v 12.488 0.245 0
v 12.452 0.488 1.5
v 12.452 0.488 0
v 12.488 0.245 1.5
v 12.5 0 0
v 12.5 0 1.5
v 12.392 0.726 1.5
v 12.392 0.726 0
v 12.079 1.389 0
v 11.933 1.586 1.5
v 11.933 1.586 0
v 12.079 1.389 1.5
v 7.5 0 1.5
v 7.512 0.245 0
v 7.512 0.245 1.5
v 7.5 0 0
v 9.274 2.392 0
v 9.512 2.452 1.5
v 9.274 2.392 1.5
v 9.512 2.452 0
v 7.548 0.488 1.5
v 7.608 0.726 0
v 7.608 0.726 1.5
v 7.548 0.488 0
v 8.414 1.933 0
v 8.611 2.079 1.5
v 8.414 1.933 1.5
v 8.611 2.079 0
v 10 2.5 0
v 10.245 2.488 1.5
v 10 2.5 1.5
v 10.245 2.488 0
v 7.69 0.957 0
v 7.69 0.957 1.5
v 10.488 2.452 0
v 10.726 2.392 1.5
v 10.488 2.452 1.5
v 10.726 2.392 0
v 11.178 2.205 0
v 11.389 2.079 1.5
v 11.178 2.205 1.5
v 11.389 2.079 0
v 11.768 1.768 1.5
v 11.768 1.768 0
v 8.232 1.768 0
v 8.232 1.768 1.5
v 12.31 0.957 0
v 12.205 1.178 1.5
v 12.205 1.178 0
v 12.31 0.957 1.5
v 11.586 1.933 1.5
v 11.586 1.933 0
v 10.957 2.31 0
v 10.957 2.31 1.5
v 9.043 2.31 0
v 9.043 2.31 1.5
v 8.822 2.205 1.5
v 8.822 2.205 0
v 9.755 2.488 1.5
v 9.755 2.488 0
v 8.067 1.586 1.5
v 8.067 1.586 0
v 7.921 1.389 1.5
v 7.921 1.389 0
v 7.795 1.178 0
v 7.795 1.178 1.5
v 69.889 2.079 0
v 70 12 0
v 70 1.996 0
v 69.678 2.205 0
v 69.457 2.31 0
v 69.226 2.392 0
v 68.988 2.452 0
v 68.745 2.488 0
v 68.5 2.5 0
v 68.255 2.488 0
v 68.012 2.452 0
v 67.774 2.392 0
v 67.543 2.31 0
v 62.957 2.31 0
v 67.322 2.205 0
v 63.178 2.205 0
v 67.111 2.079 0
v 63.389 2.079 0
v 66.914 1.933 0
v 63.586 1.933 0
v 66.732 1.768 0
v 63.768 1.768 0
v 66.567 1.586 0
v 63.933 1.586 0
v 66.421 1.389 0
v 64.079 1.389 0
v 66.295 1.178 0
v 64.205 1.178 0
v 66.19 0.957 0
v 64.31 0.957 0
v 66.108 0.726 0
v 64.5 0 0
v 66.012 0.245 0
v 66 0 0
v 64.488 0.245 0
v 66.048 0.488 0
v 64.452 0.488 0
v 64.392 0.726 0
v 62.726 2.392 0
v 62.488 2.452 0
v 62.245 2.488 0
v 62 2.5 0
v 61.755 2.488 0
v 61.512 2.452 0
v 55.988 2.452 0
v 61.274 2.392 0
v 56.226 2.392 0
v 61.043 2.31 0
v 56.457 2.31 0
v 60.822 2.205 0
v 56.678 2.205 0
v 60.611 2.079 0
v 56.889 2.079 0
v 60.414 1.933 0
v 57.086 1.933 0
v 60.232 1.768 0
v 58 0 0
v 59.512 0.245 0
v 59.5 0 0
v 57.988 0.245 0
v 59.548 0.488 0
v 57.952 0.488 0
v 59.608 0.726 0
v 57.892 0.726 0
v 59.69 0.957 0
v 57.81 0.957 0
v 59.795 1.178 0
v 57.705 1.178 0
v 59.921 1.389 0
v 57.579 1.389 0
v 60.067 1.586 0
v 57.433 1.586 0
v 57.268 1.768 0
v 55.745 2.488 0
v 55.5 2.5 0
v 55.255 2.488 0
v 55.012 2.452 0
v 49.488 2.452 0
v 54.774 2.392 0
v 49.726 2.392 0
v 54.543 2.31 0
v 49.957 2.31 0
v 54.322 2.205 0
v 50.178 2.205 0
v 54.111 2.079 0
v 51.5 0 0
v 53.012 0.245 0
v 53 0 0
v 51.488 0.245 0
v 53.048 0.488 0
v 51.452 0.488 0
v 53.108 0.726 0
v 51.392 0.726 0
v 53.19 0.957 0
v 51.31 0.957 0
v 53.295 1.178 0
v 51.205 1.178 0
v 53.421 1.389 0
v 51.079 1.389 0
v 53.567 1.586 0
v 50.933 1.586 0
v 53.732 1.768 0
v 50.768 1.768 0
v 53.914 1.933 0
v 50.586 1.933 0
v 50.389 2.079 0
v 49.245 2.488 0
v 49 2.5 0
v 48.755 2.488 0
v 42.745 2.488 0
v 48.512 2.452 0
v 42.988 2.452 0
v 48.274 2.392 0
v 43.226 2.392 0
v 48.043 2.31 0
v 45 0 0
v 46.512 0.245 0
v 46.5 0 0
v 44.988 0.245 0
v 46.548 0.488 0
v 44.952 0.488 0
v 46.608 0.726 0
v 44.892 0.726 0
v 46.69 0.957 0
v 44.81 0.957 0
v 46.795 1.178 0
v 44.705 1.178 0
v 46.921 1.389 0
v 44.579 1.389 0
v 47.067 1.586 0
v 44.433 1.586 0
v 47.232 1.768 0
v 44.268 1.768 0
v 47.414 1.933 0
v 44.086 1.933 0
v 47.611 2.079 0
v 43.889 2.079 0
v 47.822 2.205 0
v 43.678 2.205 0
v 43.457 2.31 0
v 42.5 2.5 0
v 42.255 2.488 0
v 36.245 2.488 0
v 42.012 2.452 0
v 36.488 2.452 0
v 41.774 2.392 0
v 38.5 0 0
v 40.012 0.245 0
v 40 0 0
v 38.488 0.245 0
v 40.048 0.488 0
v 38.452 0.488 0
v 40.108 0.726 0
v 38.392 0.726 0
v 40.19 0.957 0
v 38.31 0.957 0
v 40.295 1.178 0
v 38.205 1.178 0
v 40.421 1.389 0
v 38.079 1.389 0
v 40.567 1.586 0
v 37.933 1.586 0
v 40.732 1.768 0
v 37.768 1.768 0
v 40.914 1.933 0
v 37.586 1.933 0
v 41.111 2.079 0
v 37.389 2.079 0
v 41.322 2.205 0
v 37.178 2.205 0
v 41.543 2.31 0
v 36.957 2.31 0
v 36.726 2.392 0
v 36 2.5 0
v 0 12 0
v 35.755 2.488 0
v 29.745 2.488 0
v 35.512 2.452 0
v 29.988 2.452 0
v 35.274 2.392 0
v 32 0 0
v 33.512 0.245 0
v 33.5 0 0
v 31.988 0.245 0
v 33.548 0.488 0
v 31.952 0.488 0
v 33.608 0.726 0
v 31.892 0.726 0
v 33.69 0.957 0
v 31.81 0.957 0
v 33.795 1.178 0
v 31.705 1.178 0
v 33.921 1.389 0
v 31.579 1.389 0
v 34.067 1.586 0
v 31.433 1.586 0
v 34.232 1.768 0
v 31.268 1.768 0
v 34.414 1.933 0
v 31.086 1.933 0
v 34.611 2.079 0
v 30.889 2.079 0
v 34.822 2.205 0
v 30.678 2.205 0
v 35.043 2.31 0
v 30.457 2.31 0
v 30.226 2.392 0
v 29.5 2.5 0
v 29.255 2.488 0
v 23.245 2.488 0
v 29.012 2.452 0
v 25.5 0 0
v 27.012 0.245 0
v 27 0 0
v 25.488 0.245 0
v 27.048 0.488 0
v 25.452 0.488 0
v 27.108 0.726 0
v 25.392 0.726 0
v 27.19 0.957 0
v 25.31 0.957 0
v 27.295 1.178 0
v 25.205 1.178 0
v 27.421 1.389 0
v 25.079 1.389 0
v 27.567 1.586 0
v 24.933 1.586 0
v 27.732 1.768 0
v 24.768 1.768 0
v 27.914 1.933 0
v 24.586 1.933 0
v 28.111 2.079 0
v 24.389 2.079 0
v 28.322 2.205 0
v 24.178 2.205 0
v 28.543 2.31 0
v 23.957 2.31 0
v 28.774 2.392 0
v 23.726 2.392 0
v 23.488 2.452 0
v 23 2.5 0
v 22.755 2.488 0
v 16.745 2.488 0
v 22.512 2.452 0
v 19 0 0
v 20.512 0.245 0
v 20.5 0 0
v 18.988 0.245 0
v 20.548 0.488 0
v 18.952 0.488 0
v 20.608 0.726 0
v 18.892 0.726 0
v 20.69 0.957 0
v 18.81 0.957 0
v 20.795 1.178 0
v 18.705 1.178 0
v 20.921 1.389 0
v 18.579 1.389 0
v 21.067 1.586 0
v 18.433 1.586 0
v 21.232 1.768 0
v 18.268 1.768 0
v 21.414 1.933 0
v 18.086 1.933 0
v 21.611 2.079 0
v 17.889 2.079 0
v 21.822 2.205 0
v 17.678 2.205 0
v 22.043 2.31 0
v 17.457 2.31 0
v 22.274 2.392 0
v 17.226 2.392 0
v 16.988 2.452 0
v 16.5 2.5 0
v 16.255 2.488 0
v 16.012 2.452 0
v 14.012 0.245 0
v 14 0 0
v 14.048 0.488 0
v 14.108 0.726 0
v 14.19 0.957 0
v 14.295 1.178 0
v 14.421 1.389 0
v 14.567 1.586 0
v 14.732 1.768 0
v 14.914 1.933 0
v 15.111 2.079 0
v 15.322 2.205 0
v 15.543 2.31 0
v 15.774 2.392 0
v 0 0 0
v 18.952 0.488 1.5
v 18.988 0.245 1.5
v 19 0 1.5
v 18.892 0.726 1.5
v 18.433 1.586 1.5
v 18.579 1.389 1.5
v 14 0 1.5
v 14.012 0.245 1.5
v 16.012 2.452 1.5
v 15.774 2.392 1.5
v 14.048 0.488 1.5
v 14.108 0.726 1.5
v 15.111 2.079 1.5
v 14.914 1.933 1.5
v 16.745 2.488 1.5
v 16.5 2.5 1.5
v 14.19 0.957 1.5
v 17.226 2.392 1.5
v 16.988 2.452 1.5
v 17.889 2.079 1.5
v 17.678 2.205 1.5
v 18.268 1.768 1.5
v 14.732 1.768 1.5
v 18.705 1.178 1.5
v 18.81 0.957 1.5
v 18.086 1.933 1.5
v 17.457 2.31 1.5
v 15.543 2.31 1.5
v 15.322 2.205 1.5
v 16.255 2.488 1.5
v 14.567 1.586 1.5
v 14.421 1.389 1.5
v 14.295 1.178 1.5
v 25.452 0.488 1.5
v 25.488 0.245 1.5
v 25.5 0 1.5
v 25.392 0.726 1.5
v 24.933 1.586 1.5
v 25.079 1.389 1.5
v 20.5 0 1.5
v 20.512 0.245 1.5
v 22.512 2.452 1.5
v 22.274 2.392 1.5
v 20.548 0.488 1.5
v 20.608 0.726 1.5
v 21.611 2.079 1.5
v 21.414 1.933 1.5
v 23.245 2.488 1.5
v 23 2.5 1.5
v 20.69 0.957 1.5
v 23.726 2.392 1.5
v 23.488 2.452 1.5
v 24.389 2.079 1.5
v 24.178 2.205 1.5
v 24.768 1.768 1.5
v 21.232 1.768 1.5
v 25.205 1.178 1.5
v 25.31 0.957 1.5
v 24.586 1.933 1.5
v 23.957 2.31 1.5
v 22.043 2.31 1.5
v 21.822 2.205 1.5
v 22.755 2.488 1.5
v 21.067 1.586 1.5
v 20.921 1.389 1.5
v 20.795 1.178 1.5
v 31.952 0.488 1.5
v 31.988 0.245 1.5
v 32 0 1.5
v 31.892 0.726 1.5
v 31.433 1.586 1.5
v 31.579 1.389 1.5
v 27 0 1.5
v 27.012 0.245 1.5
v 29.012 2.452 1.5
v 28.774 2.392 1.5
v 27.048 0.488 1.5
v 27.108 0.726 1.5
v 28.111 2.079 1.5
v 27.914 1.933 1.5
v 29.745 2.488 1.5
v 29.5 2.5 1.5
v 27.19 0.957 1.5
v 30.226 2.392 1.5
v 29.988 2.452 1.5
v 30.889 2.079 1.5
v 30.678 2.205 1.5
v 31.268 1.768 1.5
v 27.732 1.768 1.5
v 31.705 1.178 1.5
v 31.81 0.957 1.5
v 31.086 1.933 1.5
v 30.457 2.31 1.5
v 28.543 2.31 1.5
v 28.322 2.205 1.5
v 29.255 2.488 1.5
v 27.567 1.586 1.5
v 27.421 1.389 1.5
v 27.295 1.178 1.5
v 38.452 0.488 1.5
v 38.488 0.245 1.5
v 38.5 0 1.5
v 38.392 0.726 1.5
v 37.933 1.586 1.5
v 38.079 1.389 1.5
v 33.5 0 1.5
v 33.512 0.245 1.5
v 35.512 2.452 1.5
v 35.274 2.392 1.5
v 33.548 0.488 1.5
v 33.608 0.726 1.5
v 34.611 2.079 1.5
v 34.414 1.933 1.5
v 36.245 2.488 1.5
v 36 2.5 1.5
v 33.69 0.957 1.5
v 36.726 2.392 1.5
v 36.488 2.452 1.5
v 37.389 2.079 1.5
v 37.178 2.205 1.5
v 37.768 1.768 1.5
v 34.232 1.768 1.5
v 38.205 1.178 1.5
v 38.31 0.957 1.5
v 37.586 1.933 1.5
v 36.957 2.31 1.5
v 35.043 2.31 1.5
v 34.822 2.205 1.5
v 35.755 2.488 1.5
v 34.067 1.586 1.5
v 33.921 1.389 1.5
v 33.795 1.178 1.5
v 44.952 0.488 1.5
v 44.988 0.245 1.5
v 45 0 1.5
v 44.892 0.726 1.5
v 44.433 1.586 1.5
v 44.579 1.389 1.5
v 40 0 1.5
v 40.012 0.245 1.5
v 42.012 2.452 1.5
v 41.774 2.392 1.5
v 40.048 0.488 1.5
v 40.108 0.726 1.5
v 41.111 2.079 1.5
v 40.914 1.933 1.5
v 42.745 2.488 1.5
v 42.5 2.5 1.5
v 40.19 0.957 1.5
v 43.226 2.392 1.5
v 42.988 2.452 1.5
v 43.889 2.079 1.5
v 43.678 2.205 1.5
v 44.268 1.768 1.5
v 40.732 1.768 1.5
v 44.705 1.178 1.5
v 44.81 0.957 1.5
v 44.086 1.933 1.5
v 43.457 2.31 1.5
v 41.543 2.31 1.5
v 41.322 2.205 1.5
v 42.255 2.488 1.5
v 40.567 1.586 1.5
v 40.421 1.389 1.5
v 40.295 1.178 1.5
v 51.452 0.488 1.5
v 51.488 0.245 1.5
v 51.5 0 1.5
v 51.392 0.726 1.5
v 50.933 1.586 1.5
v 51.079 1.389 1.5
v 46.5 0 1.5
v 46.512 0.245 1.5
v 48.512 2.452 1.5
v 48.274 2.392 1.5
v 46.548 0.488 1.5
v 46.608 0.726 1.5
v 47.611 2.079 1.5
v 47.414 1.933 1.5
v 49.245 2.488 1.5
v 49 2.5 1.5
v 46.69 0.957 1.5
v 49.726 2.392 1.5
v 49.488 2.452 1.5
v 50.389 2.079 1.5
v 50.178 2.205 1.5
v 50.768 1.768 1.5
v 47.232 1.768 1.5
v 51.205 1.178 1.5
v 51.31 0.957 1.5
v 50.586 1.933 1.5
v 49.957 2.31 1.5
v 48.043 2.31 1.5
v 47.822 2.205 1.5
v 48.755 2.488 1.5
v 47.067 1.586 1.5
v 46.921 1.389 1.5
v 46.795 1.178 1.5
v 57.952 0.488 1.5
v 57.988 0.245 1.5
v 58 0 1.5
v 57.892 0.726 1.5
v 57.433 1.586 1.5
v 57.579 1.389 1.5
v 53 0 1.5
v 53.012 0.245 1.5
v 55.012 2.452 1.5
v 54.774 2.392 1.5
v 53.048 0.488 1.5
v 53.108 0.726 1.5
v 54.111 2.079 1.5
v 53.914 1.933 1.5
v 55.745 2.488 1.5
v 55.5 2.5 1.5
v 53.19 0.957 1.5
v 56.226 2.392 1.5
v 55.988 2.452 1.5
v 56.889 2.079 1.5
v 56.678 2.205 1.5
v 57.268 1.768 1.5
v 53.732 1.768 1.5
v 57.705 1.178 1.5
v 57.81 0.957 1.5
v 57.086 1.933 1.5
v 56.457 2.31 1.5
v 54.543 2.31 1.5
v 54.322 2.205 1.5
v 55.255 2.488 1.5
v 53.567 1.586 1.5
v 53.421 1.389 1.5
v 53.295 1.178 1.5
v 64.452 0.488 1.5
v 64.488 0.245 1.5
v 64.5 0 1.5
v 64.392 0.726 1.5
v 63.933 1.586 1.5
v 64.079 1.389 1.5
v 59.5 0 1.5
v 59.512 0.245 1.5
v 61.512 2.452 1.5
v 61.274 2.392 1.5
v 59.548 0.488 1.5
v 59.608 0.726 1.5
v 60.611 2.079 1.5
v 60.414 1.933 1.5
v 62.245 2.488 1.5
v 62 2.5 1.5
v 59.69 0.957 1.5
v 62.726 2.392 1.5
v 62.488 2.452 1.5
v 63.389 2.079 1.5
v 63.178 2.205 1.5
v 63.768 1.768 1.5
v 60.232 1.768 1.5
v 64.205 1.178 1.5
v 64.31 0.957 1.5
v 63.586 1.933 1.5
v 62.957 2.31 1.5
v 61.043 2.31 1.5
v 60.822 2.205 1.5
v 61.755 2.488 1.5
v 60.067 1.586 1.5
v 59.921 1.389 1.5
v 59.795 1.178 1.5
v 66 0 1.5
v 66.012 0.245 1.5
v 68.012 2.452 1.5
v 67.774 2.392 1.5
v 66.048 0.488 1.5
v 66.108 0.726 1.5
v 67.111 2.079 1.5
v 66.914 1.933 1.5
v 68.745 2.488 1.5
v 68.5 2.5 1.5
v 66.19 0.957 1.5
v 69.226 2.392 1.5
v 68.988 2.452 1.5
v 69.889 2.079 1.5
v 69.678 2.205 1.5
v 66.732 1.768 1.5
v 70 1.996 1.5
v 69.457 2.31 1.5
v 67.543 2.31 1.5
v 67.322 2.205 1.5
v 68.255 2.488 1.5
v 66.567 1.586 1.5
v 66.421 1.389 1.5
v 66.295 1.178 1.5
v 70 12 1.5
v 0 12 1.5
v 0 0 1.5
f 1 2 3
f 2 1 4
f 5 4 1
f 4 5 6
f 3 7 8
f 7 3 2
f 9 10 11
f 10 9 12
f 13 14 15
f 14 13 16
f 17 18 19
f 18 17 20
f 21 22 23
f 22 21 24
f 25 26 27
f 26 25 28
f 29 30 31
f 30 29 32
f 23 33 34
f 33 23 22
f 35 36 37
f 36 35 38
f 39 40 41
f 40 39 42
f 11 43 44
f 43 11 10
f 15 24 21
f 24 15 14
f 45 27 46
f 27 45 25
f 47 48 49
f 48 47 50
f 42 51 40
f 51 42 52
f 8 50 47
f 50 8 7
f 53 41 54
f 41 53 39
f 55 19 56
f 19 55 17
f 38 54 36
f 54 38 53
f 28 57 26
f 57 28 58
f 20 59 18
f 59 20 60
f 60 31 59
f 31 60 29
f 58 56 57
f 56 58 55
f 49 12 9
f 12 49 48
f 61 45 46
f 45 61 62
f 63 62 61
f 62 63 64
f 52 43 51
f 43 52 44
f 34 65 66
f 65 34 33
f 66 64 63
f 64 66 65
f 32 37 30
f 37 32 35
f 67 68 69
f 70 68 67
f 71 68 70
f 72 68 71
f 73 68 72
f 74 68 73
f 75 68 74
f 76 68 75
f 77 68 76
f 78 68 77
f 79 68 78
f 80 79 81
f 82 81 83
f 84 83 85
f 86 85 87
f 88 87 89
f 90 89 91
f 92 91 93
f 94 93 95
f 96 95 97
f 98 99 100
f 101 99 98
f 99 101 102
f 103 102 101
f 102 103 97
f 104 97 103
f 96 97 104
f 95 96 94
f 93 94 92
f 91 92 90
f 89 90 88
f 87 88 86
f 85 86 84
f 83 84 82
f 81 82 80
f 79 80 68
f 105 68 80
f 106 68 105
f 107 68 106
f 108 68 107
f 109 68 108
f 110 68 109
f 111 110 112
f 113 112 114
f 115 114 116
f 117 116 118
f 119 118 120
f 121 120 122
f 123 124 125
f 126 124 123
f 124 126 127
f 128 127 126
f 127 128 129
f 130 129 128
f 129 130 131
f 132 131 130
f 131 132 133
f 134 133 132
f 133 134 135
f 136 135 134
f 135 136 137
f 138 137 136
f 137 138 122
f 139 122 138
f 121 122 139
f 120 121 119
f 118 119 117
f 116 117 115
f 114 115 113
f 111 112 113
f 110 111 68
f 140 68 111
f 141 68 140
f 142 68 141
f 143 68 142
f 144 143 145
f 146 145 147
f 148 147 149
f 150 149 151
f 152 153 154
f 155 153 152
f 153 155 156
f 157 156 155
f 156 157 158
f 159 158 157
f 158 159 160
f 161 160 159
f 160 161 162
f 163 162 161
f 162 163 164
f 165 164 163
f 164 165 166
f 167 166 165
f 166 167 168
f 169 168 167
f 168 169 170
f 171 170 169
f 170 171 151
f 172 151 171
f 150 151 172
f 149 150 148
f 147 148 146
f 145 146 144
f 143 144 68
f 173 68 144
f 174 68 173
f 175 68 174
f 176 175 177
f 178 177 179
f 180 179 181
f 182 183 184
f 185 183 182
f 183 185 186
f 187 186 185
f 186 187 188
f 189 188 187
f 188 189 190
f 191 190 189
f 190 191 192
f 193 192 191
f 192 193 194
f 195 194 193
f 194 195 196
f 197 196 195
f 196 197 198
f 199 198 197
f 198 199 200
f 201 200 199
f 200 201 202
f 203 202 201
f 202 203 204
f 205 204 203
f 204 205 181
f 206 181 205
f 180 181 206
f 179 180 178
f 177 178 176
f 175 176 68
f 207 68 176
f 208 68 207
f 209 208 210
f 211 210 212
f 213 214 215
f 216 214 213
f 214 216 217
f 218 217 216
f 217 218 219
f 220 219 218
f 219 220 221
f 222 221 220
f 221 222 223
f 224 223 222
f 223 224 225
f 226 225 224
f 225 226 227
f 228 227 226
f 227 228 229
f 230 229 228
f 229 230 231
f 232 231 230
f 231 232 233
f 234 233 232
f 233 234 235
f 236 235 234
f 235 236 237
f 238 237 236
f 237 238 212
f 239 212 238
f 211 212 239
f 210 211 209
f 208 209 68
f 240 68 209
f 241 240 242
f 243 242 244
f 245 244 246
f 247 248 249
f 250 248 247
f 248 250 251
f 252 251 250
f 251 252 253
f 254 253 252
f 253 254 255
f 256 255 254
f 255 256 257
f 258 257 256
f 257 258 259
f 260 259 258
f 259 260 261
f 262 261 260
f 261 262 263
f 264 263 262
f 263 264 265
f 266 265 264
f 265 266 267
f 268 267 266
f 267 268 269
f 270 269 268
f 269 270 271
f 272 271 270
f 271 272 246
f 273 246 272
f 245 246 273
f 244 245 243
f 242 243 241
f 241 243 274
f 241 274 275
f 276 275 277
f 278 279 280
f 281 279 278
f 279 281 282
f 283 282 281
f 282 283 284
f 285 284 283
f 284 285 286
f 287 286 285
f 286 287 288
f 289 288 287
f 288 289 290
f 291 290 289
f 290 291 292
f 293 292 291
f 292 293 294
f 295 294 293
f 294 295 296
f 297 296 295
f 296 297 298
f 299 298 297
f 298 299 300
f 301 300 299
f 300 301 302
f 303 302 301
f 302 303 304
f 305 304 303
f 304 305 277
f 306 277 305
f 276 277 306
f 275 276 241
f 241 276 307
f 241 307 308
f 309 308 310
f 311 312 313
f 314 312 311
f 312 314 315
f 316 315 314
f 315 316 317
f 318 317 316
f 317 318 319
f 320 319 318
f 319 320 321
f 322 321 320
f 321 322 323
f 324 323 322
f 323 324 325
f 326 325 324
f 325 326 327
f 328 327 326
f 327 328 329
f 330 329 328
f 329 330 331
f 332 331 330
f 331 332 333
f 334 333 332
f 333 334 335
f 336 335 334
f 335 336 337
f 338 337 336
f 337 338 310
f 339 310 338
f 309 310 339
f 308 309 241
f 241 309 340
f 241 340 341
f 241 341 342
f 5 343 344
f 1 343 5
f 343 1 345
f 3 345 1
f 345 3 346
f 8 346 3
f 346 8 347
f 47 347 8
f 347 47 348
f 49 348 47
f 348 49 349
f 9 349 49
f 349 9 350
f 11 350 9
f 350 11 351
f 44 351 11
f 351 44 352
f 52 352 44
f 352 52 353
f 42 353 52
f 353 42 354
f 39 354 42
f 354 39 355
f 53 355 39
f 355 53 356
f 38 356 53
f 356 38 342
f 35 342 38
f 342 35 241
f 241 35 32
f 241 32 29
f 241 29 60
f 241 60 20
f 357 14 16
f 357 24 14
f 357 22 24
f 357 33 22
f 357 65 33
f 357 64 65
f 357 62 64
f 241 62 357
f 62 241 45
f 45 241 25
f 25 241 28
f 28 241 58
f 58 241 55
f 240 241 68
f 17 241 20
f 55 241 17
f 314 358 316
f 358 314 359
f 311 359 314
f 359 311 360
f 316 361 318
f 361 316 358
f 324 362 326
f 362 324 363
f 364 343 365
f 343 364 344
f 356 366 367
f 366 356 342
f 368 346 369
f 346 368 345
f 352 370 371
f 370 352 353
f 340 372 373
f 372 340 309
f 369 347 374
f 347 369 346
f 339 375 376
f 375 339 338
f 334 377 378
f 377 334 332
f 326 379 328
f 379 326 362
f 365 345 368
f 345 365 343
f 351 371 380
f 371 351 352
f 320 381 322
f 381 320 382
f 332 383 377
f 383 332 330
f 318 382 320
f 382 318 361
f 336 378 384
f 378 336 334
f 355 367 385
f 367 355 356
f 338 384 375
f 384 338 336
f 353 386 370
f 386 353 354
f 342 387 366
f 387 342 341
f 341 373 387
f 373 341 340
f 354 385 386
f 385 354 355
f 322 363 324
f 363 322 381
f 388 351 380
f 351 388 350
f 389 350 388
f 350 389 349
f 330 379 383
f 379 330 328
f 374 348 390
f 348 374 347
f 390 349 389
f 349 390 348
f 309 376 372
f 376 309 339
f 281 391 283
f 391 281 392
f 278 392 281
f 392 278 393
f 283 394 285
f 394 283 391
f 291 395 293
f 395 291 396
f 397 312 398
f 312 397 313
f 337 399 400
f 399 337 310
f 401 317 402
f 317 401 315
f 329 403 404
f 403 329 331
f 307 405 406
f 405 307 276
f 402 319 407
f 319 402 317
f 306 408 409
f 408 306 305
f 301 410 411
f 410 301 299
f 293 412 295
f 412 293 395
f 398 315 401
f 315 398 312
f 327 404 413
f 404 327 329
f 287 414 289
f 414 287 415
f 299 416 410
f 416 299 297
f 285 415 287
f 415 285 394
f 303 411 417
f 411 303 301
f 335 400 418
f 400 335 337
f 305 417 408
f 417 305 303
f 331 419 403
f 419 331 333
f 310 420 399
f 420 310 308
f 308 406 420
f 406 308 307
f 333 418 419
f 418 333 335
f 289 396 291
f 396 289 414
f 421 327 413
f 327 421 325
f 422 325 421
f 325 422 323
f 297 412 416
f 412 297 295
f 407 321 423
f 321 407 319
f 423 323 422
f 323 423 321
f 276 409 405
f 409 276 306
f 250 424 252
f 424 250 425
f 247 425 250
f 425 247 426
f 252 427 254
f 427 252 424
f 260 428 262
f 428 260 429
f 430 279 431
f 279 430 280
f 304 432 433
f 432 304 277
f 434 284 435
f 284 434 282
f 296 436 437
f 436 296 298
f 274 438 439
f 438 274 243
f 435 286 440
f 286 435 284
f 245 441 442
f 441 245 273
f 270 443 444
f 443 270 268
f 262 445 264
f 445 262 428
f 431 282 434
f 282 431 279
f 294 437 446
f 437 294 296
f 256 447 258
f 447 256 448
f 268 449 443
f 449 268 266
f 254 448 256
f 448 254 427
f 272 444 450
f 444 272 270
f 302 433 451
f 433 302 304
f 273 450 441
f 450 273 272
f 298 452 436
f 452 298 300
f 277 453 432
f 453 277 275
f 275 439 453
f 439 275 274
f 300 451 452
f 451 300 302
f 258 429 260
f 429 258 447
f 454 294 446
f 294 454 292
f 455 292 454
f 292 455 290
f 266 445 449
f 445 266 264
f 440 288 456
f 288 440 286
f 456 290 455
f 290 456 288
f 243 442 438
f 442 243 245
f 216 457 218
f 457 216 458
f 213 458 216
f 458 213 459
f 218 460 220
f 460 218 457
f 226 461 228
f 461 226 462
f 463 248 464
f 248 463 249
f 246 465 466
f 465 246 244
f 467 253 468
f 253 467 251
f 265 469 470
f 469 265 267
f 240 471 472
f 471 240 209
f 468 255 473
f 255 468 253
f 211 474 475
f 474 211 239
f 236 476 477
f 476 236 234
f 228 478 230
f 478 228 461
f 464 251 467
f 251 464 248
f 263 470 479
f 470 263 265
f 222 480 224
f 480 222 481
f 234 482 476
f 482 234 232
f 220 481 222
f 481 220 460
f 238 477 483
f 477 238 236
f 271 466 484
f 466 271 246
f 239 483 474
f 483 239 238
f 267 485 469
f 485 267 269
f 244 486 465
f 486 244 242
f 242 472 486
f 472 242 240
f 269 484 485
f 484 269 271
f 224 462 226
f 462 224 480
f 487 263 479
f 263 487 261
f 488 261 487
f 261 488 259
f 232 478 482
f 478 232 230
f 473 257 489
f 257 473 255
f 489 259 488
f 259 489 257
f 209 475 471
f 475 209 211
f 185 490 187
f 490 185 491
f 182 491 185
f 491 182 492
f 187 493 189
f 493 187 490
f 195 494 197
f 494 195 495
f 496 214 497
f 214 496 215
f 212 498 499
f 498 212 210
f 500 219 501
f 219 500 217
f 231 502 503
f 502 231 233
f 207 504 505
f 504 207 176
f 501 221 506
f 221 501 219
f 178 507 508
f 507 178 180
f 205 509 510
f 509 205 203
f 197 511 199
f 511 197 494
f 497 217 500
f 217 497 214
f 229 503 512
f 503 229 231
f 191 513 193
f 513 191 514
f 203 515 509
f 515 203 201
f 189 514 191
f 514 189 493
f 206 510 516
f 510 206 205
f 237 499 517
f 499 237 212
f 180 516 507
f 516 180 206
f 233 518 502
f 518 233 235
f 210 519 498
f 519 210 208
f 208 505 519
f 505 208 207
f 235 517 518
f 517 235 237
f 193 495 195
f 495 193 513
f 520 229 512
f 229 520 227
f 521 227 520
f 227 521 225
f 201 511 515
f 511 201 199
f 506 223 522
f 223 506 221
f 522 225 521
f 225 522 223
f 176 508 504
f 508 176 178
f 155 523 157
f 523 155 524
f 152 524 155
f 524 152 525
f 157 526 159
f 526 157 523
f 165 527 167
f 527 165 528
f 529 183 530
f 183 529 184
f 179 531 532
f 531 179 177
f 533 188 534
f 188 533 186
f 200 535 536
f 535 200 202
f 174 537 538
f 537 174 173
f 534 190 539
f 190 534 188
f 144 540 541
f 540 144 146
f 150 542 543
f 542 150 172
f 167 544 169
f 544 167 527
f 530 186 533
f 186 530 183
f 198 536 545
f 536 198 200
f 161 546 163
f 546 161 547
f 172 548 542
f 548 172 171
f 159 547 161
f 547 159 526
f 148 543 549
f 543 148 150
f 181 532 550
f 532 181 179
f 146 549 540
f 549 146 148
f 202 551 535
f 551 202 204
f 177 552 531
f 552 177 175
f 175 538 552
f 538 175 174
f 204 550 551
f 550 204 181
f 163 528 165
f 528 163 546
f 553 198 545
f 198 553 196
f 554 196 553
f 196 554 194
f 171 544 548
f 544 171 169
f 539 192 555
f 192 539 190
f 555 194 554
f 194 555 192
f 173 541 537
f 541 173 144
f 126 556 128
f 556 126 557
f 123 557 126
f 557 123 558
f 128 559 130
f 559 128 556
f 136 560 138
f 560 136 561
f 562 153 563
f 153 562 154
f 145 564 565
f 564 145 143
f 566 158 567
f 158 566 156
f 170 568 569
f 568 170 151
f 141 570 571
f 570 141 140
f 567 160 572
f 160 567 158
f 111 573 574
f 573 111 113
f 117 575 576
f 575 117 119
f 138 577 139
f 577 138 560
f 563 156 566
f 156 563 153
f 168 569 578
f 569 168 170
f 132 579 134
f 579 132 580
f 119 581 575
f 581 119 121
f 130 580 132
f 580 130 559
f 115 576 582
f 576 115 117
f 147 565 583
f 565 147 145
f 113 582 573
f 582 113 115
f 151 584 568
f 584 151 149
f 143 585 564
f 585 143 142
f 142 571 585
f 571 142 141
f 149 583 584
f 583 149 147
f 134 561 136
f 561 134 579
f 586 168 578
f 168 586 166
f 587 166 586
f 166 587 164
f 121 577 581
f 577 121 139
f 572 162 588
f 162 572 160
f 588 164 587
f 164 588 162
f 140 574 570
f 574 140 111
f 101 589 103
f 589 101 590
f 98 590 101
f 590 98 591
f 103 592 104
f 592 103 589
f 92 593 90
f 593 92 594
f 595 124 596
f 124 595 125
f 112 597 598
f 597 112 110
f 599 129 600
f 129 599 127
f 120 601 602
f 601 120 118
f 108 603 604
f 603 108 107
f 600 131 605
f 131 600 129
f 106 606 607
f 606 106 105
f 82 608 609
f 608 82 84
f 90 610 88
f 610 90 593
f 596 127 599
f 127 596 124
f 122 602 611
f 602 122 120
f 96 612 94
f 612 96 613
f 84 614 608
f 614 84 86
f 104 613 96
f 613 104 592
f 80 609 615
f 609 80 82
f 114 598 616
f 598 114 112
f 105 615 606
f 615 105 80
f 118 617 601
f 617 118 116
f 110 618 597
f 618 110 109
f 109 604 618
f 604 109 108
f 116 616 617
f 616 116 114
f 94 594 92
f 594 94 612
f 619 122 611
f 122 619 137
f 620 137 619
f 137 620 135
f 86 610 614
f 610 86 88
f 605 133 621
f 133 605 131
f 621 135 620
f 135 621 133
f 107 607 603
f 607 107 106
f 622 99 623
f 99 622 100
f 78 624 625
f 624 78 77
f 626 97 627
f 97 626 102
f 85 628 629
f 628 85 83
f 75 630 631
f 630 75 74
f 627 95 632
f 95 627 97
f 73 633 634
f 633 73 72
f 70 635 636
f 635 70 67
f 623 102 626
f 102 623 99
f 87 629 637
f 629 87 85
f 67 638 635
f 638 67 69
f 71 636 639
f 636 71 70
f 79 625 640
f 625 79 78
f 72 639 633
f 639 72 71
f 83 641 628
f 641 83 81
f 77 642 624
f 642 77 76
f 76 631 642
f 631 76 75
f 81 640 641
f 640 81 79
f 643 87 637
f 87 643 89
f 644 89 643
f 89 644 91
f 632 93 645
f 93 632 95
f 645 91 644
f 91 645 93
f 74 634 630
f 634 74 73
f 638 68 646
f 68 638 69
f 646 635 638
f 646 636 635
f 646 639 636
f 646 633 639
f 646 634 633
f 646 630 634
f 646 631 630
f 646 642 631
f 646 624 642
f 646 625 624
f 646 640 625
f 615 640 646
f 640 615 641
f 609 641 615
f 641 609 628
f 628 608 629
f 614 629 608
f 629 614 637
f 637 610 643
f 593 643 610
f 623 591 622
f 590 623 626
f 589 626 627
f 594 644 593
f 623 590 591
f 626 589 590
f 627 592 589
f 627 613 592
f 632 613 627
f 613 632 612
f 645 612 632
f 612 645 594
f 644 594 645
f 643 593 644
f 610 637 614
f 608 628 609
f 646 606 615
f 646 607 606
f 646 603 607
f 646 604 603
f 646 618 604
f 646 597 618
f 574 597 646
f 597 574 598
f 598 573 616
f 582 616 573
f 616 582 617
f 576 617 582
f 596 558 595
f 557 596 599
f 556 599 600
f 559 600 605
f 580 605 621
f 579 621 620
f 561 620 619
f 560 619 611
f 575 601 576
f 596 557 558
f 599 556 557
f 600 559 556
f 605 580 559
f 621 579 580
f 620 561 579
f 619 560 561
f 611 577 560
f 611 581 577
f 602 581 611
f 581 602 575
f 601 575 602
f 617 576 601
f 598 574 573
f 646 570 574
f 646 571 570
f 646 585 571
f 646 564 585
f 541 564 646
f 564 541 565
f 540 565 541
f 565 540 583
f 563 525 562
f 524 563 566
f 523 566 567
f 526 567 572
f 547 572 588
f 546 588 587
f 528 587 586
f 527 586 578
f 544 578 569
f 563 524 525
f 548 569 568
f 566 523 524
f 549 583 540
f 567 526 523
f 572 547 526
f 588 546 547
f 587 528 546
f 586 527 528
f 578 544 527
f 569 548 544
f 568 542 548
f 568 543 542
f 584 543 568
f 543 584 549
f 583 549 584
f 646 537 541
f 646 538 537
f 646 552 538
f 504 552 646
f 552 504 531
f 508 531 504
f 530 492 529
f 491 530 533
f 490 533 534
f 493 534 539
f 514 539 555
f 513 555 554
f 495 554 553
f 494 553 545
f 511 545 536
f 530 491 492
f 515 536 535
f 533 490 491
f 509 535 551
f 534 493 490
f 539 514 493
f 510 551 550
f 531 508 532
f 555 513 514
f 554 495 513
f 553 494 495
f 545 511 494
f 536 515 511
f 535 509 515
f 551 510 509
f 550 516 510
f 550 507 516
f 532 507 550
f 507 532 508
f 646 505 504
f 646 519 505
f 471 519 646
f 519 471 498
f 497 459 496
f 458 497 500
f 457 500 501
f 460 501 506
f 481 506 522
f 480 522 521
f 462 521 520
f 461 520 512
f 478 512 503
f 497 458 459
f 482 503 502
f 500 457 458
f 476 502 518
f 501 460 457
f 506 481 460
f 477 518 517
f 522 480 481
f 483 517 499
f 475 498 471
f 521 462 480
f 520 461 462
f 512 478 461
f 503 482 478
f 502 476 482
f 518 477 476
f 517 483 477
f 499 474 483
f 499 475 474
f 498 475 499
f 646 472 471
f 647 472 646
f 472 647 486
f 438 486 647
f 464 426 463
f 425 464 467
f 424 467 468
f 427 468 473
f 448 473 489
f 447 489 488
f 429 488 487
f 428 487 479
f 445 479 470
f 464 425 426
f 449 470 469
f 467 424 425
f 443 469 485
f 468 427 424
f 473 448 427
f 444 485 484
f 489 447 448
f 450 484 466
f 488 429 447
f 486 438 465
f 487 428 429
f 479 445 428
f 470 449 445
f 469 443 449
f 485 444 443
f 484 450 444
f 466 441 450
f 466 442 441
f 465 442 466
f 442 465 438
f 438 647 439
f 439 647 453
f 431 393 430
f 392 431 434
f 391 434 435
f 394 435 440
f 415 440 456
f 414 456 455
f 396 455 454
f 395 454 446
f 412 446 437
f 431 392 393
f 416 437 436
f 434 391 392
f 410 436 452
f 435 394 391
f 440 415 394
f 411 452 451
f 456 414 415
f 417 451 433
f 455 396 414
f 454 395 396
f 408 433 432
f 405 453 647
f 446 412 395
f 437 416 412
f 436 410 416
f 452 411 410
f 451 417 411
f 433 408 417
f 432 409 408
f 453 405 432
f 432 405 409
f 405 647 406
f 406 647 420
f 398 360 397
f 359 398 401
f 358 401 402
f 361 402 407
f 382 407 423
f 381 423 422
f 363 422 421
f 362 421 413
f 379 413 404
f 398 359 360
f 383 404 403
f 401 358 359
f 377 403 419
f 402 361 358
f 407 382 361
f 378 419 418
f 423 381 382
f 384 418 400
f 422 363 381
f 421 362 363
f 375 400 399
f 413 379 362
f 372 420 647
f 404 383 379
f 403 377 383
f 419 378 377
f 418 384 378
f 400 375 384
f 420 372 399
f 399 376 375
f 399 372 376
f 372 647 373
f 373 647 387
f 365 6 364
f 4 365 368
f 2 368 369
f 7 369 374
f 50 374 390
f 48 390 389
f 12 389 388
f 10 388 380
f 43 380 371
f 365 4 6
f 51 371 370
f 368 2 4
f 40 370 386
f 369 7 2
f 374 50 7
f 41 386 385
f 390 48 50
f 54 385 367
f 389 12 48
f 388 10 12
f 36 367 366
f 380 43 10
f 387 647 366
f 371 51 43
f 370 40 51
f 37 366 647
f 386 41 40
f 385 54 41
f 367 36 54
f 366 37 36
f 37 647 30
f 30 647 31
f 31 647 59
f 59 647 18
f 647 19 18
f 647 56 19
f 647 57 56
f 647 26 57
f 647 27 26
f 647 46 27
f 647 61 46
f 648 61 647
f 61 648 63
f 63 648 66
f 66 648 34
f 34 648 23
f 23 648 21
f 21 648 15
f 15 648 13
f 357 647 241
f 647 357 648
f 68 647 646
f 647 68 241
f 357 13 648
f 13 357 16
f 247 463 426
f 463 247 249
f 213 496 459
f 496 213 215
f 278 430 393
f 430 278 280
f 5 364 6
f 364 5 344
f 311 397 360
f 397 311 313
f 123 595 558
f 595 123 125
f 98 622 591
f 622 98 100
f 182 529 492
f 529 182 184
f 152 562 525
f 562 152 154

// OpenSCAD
$fn = 128;

// --- Dimensions ---
// Spine dimensions
$spine_length = 70;   // X dimension
$spine_width = 12;    // Y dimension
$plate_thickness = 1.5; // Z dimension

// Tooth dimensions
$tooth_width = 5.0;   // X dimension
$tooth_length = 12;   // Y dimension (matches spine width)
$tooth_count = 10;    // Number of wells
$gap_size = 1.5;      // Gap between teeth

// Derived dimensions
$tooth_spacing = $tooth_width + $gap_size;
$total_teeth_width = $tooth_count * $tooth_width;
$center_offset = ($spine_length - $total_teeth_width) / 2;

// --- Main Body ---
difference() {
    // Outer block (Spine)
    cube([
        $spine_length, 
        $spine_width, 
        $plate_thickness
    ]);
    
    // Cut out the 10 wells
    // Align Y=0 with the spine edge to ensure teeth hang from that edge
    for (i = [0 : $tooth_count - 1]) {
        translate([
            $center_offset + (i * $tooth_spacing), 
            0, // Align with spine edge (Y=0)
            0
        ]) {
            cylinder(
                h = $plate_thickness + 0.1, // Extend slightly past face
                r = $tooth_width / 2,
                $fn = 64
            );
        }
    }
}
